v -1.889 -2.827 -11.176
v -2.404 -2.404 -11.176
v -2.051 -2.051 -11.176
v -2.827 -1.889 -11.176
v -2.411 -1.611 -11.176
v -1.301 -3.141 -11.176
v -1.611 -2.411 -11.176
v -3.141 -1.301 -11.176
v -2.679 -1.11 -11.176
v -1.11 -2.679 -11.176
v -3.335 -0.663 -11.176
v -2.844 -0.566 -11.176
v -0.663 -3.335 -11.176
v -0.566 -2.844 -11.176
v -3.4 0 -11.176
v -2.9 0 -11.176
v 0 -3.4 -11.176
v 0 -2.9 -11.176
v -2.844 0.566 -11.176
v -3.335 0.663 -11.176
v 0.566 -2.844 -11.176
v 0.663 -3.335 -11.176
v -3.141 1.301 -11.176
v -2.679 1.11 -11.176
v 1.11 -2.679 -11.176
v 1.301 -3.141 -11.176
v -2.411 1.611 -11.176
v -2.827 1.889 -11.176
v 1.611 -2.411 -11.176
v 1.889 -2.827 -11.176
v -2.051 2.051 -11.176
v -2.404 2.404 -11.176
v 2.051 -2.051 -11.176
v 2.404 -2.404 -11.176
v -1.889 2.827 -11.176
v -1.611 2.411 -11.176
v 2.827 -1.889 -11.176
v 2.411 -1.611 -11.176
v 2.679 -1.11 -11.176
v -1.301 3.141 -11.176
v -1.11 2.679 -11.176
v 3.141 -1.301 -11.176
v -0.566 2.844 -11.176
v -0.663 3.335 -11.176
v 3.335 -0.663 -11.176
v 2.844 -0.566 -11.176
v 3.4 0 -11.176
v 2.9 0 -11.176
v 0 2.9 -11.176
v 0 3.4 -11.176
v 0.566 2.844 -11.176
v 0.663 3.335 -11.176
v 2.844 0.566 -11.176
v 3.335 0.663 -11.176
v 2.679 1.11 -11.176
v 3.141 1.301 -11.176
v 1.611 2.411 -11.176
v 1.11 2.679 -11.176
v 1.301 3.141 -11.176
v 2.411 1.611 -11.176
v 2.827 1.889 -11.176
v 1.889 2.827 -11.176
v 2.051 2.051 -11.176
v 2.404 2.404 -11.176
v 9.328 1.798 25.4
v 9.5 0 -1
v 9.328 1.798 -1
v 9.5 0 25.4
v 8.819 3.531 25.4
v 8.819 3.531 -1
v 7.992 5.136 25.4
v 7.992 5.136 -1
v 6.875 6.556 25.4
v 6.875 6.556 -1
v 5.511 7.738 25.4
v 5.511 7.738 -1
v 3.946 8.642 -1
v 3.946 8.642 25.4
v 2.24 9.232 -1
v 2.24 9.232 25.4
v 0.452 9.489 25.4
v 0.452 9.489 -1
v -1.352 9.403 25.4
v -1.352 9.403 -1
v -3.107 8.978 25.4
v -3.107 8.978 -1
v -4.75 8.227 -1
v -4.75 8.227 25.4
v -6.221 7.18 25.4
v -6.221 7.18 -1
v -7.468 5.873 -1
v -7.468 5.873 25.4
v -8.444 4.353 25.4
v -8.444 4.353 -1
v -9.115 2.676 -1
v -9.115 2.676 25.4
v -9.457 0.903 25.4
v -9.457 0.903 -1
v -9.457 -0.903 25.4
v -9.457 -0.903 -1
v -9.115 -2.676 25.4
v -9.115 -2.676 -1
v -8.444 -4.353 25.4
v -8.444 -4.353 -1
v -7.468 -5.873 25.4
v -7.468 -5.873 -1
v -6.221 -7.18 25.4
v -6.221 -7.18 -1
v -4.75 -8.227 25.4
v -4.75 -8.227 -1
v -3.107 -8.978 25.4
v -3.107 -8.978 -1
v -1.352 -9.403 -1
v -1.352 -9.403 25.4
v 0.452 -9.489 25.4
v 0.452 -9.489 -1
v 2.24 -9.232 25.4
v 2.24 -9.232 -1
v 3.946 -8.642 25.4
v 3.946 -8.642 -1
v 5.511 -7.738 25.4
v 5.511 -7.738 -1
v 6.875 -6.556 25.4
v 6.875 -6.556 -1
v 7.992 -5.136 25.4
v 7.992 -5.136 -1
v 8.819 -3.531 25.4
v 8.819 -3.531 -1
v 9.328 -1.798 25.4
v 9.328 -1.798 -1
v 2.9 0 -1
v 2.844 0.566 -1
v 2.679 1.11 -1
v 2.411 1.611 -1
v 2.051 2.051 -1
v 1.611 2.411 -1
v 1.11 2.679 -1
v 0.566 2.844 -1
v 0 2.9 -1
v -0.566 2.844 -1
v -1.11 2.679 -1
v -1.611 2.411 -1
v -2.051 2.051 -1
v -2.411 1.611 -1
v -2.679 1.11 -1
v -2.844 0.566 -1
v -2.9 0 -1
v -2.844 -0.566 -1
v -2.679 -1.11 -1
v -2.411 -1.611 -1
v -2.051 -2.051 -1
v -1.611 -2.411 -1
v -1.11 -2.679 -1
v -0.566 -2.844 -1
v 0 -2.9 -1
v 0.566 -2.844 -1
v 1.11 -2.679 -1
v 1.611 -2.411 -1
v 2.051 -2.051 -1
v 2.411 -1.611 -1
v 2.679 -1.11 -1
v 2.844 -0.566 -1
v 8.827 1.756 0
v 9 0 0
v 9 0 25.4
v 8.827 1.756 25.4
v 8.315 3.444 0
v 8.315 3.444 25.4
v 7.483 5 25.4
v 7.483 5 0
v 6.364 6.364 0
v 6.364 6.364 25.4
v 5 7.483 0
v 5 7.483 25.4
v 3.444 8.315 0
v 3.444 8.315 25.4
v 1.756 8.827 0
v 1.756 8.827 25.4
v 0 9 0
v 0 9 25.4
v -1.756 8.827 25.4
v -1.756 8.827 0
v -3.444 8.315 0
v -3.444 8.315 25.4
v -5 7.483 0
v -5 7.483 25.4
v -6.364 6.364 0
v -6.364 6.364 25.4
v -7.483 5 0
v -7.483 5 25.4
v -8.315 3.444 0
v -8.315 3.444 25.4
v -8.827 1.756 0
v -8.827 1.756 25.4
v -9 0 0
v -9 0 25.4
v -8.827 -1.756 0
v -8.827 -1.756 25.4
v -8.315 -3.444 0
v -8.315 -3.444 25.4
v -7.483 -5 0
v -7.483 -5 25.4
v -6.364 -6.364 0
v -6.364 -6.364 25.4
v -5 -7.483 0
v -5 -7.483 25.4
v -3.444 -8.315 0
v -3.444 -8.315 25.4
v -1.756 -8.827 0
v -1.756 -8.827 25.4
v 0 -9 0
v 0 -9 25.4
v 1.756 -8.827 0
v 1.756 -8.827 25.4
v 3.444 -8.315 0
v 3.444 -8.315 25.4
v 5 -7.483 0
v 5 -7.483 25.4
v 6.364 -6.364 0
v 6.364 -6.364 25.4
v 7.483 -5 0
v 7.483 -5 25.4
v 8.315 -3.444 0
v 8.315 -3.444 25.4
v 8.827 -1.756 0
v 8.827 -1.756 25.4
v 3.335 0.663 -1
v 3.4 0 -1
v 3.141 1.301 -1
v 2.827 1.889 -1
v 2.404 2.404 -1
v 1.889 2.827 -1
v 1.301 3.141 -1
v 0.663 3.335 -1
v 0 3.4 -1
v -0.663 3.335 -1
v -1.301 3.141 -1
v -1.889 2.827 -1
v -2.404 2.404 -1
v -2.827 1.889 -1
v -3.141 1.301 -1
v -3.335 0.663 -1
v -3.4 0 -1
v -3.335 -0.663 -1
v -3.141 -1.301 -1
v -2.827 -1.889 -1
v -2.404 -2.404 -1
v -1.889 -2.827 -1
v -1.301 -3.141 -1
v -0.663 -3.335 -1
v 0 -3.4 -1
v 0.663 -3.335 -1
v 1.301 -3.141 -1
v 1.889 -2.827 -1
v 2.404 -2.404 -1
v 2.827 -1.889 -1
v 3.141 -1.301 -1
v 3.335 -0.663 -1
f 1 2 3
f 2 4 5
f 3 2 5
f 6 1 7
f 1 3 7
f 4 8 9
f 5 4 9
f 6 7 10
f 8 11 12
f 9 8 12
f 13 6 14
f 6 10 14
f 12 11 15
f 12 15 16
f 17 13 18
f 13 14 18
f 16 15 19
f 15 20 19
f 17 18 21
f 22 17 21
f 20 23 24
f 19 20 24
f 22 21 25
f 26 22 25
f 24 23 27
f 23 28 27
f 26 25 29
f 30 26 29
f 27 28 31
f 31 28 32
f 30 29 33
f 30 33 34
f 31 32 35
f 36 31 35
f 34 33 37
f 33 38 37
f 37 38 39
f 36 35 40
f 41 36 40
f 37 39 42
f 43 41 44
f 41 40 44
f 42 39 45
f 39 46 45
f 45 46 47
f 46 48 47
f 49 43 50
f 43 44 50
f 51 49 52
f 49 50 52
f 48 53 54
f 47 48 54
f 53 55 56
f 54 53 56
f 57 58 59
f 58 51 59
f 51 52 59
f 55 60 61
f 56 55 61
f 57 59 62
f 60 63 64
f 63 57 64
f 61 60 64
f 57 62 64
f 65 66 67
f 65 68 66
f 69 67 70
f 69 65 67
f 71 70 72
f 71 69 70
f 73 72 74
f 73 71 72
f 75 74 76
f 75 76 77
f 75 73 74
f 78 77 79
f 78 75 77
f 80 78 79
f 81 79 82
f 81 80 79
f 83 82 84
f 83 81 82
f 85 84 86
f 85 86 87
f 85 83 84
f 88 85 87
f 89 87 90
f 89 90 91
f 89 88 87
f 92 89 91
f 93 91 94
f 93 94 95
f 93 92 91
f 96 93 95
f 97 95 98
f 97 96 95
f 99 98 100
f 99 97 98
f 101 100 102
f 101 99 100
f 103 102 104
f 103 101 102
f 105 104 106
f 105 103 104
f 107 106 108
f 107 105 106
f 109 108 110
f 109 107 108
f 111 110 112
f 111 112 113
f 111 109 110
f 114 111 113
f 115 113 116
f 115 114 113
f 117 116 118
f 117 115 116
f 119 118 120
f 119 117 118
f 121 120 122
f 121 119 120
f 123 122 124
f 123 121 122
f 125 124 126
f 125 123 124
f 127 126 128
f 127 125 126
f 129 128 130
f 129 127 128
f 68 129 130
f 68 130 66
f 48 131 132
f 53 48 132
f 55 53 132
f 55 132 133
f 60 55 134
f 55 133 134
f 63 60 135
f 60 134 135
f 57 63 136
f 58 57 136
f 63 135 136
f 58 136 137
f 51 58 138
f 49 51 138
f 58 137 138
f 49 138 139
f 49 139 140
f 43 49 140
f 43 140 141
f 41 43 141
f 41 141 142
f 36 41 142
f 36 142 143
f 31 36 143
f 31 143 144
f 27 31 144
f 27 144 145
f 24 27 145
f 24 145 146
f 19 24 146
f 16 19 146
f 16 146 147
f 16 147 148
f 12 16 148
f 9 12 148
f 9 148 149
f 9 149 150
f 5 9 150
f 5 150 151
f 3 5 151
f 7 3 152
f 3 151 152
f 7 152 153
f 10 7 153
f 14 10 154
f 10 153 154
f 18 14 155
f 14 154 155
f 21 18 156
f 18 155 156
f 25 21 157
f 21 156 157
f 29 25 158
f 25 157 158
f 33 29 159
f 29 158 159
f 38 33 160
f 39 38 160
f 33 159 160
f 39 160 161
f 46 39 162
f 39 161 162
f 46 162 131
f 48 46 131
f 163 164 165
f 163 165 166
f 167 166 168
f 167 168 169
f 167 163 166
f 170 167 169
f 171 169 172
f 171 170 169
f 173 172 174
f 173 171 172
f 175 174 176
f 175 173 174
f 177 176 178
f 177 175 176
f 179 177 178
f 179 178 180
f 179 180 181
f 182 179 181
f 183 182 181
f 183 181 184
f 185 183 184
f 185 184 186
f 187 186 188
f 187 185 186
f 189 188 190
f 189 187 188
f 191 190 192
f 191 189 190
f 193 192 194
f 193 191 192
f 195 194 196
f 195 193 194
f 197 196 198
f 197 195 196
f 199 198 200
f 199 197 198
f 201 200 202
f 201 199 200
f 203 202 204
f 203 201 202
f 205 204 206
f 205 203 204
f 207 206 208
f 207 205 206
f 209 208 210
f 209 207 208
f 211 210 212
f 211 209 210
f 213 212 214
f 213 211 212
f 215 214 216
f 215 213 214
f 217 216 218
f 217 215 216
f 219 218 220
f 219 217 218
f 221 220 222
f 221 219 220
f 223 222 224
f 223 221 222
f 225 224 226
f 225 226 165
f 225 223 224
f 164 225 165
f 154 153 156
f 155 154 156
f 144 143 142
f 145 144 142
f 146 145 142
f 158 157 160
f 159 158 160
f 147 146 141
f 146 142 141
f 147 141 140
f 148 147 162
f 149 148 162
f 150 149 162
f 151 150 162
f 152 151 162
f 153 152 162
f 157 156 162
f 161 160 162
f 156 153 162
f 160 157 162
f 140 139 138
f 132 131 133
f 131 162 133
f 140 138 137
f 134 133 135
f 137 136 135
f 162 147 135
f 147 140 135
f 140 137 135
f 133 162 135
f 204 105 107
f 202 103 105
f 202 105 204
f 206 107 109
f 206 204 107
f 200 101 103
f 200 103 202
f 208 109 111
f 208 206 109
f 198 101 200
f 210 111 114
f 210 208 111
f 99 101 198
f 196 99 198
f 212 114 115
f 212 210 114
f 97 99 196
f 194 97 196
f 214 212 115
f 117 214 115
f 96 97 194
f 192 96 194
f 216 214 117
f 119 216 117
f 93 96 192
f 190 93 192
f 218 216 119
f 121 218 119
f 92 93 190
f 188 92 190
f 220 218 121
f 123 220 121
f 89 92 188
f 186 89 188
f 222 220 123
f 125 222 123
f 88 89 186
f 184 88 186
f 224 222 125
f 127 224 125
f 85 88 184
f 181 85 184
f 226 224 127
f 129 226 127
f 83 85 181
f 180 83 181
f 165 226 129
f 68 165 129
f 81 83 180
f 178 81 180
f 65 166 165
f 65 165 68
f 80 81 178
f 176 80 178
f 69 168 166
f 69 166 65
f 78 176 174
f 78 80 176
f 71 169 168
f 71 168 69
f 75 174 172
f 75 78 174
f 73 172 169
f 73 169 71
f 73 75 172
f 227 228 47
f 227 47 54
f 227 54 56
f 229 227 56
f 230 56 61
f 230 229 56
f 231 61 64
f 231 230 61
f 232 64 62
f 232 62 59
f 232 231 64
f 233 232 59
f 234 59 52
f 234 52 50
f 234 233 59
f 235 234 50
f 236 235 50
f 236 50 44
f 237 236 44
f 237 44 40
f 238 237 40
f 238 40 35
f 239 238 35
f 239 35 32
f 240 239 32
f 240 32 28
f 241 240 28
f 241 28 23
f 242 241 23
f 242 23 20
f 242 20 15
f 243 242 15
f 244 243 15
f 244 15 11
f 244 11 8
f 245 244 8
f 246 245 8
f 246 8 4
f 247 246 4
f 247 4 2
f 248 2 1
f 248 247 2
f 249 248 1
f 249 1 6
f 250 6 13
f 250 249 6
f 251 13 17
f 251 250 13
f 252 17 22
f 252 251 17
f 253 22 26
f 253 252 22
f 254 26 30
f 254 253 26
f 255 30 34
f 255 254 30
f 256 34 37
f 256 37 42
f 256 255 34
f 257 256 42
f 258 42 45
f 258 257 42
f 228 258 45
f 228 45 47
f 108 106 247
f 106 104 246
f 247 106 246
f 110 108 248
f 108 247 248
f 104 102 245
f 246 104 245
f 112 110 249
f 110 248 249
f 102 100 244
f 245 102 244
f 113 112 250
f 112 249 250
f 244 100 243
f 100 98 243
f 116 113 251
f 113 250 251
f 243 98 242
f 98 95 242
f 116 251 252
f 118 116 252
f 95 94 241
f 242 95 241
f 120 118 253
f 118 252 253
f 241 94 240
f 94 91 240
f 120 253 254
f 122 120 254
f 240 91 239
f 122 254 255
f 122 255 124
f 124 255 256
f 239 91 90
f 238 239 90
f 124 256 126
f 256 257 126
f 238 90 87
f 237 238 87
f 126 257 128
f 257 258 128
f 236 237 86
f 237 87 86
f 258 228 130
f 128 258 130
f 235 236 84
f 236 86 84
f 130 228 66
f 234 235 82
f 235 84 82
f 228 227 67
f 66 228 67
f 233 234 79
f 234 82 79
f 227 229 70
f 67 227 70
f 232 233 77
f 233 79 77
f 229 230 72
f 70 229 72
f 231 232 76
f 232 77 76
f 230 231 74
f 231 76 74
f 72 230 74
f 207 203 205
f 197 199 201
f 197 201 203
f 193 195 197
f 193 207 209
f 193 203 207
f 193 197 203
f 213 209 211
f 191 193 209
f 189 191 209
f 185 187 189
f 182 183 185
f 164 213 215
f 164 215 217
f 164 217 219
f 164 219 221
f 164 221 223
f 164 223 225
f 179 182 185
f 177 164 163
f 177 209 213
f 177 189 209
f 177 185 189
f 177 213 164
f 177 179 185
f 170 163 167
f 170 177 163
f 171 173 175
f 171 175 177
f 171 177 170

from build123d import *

# Parameters (mm, degrees)
F0_R     = 9.5
F0_R_2   = 9
F1_DEPTH = 25.4
F0_R_3   = 3.4
F0_R_4   = 2.9
F2_DEPTH = 1
F3_DEPTH = 11.176


with BuildPart() as f1:
    # F0 (on Top) → F1 (new body)
    with BuildSketch(Plane.XY):
        Circle(F0_R)
        Circle(F0_R_2, mode=Mode.SUBTRACT)
    extrude(amount=F1_DEPTH)

    # F0 (on Top) → F2 (join)
    with BuildSketch(Plane.XY):
        Circle(F0_R)
        Circle(F0_R_2, mode=Mode.SUBTRACT)
        Circle(F0_R_2)
        Circle(F0_R_3, mode=Mode.SUBTRACT)
        Circle(F0_R_3)
        Circle(F0_R_4, mode=Mode.SUBTRACT)
        Circle(F0_R_4)
    extrude(amount=-F2_DEPTH)

    # F0 (on Top) → F3 (join)
    with BuildSketch(Plane.XY):
        Circle(F0_R_3)
        Circle(F0_R_4, mode=Mode.SUBTRACT)
    extrude(amount=-F3_DEPTH)


solid = f1.part
